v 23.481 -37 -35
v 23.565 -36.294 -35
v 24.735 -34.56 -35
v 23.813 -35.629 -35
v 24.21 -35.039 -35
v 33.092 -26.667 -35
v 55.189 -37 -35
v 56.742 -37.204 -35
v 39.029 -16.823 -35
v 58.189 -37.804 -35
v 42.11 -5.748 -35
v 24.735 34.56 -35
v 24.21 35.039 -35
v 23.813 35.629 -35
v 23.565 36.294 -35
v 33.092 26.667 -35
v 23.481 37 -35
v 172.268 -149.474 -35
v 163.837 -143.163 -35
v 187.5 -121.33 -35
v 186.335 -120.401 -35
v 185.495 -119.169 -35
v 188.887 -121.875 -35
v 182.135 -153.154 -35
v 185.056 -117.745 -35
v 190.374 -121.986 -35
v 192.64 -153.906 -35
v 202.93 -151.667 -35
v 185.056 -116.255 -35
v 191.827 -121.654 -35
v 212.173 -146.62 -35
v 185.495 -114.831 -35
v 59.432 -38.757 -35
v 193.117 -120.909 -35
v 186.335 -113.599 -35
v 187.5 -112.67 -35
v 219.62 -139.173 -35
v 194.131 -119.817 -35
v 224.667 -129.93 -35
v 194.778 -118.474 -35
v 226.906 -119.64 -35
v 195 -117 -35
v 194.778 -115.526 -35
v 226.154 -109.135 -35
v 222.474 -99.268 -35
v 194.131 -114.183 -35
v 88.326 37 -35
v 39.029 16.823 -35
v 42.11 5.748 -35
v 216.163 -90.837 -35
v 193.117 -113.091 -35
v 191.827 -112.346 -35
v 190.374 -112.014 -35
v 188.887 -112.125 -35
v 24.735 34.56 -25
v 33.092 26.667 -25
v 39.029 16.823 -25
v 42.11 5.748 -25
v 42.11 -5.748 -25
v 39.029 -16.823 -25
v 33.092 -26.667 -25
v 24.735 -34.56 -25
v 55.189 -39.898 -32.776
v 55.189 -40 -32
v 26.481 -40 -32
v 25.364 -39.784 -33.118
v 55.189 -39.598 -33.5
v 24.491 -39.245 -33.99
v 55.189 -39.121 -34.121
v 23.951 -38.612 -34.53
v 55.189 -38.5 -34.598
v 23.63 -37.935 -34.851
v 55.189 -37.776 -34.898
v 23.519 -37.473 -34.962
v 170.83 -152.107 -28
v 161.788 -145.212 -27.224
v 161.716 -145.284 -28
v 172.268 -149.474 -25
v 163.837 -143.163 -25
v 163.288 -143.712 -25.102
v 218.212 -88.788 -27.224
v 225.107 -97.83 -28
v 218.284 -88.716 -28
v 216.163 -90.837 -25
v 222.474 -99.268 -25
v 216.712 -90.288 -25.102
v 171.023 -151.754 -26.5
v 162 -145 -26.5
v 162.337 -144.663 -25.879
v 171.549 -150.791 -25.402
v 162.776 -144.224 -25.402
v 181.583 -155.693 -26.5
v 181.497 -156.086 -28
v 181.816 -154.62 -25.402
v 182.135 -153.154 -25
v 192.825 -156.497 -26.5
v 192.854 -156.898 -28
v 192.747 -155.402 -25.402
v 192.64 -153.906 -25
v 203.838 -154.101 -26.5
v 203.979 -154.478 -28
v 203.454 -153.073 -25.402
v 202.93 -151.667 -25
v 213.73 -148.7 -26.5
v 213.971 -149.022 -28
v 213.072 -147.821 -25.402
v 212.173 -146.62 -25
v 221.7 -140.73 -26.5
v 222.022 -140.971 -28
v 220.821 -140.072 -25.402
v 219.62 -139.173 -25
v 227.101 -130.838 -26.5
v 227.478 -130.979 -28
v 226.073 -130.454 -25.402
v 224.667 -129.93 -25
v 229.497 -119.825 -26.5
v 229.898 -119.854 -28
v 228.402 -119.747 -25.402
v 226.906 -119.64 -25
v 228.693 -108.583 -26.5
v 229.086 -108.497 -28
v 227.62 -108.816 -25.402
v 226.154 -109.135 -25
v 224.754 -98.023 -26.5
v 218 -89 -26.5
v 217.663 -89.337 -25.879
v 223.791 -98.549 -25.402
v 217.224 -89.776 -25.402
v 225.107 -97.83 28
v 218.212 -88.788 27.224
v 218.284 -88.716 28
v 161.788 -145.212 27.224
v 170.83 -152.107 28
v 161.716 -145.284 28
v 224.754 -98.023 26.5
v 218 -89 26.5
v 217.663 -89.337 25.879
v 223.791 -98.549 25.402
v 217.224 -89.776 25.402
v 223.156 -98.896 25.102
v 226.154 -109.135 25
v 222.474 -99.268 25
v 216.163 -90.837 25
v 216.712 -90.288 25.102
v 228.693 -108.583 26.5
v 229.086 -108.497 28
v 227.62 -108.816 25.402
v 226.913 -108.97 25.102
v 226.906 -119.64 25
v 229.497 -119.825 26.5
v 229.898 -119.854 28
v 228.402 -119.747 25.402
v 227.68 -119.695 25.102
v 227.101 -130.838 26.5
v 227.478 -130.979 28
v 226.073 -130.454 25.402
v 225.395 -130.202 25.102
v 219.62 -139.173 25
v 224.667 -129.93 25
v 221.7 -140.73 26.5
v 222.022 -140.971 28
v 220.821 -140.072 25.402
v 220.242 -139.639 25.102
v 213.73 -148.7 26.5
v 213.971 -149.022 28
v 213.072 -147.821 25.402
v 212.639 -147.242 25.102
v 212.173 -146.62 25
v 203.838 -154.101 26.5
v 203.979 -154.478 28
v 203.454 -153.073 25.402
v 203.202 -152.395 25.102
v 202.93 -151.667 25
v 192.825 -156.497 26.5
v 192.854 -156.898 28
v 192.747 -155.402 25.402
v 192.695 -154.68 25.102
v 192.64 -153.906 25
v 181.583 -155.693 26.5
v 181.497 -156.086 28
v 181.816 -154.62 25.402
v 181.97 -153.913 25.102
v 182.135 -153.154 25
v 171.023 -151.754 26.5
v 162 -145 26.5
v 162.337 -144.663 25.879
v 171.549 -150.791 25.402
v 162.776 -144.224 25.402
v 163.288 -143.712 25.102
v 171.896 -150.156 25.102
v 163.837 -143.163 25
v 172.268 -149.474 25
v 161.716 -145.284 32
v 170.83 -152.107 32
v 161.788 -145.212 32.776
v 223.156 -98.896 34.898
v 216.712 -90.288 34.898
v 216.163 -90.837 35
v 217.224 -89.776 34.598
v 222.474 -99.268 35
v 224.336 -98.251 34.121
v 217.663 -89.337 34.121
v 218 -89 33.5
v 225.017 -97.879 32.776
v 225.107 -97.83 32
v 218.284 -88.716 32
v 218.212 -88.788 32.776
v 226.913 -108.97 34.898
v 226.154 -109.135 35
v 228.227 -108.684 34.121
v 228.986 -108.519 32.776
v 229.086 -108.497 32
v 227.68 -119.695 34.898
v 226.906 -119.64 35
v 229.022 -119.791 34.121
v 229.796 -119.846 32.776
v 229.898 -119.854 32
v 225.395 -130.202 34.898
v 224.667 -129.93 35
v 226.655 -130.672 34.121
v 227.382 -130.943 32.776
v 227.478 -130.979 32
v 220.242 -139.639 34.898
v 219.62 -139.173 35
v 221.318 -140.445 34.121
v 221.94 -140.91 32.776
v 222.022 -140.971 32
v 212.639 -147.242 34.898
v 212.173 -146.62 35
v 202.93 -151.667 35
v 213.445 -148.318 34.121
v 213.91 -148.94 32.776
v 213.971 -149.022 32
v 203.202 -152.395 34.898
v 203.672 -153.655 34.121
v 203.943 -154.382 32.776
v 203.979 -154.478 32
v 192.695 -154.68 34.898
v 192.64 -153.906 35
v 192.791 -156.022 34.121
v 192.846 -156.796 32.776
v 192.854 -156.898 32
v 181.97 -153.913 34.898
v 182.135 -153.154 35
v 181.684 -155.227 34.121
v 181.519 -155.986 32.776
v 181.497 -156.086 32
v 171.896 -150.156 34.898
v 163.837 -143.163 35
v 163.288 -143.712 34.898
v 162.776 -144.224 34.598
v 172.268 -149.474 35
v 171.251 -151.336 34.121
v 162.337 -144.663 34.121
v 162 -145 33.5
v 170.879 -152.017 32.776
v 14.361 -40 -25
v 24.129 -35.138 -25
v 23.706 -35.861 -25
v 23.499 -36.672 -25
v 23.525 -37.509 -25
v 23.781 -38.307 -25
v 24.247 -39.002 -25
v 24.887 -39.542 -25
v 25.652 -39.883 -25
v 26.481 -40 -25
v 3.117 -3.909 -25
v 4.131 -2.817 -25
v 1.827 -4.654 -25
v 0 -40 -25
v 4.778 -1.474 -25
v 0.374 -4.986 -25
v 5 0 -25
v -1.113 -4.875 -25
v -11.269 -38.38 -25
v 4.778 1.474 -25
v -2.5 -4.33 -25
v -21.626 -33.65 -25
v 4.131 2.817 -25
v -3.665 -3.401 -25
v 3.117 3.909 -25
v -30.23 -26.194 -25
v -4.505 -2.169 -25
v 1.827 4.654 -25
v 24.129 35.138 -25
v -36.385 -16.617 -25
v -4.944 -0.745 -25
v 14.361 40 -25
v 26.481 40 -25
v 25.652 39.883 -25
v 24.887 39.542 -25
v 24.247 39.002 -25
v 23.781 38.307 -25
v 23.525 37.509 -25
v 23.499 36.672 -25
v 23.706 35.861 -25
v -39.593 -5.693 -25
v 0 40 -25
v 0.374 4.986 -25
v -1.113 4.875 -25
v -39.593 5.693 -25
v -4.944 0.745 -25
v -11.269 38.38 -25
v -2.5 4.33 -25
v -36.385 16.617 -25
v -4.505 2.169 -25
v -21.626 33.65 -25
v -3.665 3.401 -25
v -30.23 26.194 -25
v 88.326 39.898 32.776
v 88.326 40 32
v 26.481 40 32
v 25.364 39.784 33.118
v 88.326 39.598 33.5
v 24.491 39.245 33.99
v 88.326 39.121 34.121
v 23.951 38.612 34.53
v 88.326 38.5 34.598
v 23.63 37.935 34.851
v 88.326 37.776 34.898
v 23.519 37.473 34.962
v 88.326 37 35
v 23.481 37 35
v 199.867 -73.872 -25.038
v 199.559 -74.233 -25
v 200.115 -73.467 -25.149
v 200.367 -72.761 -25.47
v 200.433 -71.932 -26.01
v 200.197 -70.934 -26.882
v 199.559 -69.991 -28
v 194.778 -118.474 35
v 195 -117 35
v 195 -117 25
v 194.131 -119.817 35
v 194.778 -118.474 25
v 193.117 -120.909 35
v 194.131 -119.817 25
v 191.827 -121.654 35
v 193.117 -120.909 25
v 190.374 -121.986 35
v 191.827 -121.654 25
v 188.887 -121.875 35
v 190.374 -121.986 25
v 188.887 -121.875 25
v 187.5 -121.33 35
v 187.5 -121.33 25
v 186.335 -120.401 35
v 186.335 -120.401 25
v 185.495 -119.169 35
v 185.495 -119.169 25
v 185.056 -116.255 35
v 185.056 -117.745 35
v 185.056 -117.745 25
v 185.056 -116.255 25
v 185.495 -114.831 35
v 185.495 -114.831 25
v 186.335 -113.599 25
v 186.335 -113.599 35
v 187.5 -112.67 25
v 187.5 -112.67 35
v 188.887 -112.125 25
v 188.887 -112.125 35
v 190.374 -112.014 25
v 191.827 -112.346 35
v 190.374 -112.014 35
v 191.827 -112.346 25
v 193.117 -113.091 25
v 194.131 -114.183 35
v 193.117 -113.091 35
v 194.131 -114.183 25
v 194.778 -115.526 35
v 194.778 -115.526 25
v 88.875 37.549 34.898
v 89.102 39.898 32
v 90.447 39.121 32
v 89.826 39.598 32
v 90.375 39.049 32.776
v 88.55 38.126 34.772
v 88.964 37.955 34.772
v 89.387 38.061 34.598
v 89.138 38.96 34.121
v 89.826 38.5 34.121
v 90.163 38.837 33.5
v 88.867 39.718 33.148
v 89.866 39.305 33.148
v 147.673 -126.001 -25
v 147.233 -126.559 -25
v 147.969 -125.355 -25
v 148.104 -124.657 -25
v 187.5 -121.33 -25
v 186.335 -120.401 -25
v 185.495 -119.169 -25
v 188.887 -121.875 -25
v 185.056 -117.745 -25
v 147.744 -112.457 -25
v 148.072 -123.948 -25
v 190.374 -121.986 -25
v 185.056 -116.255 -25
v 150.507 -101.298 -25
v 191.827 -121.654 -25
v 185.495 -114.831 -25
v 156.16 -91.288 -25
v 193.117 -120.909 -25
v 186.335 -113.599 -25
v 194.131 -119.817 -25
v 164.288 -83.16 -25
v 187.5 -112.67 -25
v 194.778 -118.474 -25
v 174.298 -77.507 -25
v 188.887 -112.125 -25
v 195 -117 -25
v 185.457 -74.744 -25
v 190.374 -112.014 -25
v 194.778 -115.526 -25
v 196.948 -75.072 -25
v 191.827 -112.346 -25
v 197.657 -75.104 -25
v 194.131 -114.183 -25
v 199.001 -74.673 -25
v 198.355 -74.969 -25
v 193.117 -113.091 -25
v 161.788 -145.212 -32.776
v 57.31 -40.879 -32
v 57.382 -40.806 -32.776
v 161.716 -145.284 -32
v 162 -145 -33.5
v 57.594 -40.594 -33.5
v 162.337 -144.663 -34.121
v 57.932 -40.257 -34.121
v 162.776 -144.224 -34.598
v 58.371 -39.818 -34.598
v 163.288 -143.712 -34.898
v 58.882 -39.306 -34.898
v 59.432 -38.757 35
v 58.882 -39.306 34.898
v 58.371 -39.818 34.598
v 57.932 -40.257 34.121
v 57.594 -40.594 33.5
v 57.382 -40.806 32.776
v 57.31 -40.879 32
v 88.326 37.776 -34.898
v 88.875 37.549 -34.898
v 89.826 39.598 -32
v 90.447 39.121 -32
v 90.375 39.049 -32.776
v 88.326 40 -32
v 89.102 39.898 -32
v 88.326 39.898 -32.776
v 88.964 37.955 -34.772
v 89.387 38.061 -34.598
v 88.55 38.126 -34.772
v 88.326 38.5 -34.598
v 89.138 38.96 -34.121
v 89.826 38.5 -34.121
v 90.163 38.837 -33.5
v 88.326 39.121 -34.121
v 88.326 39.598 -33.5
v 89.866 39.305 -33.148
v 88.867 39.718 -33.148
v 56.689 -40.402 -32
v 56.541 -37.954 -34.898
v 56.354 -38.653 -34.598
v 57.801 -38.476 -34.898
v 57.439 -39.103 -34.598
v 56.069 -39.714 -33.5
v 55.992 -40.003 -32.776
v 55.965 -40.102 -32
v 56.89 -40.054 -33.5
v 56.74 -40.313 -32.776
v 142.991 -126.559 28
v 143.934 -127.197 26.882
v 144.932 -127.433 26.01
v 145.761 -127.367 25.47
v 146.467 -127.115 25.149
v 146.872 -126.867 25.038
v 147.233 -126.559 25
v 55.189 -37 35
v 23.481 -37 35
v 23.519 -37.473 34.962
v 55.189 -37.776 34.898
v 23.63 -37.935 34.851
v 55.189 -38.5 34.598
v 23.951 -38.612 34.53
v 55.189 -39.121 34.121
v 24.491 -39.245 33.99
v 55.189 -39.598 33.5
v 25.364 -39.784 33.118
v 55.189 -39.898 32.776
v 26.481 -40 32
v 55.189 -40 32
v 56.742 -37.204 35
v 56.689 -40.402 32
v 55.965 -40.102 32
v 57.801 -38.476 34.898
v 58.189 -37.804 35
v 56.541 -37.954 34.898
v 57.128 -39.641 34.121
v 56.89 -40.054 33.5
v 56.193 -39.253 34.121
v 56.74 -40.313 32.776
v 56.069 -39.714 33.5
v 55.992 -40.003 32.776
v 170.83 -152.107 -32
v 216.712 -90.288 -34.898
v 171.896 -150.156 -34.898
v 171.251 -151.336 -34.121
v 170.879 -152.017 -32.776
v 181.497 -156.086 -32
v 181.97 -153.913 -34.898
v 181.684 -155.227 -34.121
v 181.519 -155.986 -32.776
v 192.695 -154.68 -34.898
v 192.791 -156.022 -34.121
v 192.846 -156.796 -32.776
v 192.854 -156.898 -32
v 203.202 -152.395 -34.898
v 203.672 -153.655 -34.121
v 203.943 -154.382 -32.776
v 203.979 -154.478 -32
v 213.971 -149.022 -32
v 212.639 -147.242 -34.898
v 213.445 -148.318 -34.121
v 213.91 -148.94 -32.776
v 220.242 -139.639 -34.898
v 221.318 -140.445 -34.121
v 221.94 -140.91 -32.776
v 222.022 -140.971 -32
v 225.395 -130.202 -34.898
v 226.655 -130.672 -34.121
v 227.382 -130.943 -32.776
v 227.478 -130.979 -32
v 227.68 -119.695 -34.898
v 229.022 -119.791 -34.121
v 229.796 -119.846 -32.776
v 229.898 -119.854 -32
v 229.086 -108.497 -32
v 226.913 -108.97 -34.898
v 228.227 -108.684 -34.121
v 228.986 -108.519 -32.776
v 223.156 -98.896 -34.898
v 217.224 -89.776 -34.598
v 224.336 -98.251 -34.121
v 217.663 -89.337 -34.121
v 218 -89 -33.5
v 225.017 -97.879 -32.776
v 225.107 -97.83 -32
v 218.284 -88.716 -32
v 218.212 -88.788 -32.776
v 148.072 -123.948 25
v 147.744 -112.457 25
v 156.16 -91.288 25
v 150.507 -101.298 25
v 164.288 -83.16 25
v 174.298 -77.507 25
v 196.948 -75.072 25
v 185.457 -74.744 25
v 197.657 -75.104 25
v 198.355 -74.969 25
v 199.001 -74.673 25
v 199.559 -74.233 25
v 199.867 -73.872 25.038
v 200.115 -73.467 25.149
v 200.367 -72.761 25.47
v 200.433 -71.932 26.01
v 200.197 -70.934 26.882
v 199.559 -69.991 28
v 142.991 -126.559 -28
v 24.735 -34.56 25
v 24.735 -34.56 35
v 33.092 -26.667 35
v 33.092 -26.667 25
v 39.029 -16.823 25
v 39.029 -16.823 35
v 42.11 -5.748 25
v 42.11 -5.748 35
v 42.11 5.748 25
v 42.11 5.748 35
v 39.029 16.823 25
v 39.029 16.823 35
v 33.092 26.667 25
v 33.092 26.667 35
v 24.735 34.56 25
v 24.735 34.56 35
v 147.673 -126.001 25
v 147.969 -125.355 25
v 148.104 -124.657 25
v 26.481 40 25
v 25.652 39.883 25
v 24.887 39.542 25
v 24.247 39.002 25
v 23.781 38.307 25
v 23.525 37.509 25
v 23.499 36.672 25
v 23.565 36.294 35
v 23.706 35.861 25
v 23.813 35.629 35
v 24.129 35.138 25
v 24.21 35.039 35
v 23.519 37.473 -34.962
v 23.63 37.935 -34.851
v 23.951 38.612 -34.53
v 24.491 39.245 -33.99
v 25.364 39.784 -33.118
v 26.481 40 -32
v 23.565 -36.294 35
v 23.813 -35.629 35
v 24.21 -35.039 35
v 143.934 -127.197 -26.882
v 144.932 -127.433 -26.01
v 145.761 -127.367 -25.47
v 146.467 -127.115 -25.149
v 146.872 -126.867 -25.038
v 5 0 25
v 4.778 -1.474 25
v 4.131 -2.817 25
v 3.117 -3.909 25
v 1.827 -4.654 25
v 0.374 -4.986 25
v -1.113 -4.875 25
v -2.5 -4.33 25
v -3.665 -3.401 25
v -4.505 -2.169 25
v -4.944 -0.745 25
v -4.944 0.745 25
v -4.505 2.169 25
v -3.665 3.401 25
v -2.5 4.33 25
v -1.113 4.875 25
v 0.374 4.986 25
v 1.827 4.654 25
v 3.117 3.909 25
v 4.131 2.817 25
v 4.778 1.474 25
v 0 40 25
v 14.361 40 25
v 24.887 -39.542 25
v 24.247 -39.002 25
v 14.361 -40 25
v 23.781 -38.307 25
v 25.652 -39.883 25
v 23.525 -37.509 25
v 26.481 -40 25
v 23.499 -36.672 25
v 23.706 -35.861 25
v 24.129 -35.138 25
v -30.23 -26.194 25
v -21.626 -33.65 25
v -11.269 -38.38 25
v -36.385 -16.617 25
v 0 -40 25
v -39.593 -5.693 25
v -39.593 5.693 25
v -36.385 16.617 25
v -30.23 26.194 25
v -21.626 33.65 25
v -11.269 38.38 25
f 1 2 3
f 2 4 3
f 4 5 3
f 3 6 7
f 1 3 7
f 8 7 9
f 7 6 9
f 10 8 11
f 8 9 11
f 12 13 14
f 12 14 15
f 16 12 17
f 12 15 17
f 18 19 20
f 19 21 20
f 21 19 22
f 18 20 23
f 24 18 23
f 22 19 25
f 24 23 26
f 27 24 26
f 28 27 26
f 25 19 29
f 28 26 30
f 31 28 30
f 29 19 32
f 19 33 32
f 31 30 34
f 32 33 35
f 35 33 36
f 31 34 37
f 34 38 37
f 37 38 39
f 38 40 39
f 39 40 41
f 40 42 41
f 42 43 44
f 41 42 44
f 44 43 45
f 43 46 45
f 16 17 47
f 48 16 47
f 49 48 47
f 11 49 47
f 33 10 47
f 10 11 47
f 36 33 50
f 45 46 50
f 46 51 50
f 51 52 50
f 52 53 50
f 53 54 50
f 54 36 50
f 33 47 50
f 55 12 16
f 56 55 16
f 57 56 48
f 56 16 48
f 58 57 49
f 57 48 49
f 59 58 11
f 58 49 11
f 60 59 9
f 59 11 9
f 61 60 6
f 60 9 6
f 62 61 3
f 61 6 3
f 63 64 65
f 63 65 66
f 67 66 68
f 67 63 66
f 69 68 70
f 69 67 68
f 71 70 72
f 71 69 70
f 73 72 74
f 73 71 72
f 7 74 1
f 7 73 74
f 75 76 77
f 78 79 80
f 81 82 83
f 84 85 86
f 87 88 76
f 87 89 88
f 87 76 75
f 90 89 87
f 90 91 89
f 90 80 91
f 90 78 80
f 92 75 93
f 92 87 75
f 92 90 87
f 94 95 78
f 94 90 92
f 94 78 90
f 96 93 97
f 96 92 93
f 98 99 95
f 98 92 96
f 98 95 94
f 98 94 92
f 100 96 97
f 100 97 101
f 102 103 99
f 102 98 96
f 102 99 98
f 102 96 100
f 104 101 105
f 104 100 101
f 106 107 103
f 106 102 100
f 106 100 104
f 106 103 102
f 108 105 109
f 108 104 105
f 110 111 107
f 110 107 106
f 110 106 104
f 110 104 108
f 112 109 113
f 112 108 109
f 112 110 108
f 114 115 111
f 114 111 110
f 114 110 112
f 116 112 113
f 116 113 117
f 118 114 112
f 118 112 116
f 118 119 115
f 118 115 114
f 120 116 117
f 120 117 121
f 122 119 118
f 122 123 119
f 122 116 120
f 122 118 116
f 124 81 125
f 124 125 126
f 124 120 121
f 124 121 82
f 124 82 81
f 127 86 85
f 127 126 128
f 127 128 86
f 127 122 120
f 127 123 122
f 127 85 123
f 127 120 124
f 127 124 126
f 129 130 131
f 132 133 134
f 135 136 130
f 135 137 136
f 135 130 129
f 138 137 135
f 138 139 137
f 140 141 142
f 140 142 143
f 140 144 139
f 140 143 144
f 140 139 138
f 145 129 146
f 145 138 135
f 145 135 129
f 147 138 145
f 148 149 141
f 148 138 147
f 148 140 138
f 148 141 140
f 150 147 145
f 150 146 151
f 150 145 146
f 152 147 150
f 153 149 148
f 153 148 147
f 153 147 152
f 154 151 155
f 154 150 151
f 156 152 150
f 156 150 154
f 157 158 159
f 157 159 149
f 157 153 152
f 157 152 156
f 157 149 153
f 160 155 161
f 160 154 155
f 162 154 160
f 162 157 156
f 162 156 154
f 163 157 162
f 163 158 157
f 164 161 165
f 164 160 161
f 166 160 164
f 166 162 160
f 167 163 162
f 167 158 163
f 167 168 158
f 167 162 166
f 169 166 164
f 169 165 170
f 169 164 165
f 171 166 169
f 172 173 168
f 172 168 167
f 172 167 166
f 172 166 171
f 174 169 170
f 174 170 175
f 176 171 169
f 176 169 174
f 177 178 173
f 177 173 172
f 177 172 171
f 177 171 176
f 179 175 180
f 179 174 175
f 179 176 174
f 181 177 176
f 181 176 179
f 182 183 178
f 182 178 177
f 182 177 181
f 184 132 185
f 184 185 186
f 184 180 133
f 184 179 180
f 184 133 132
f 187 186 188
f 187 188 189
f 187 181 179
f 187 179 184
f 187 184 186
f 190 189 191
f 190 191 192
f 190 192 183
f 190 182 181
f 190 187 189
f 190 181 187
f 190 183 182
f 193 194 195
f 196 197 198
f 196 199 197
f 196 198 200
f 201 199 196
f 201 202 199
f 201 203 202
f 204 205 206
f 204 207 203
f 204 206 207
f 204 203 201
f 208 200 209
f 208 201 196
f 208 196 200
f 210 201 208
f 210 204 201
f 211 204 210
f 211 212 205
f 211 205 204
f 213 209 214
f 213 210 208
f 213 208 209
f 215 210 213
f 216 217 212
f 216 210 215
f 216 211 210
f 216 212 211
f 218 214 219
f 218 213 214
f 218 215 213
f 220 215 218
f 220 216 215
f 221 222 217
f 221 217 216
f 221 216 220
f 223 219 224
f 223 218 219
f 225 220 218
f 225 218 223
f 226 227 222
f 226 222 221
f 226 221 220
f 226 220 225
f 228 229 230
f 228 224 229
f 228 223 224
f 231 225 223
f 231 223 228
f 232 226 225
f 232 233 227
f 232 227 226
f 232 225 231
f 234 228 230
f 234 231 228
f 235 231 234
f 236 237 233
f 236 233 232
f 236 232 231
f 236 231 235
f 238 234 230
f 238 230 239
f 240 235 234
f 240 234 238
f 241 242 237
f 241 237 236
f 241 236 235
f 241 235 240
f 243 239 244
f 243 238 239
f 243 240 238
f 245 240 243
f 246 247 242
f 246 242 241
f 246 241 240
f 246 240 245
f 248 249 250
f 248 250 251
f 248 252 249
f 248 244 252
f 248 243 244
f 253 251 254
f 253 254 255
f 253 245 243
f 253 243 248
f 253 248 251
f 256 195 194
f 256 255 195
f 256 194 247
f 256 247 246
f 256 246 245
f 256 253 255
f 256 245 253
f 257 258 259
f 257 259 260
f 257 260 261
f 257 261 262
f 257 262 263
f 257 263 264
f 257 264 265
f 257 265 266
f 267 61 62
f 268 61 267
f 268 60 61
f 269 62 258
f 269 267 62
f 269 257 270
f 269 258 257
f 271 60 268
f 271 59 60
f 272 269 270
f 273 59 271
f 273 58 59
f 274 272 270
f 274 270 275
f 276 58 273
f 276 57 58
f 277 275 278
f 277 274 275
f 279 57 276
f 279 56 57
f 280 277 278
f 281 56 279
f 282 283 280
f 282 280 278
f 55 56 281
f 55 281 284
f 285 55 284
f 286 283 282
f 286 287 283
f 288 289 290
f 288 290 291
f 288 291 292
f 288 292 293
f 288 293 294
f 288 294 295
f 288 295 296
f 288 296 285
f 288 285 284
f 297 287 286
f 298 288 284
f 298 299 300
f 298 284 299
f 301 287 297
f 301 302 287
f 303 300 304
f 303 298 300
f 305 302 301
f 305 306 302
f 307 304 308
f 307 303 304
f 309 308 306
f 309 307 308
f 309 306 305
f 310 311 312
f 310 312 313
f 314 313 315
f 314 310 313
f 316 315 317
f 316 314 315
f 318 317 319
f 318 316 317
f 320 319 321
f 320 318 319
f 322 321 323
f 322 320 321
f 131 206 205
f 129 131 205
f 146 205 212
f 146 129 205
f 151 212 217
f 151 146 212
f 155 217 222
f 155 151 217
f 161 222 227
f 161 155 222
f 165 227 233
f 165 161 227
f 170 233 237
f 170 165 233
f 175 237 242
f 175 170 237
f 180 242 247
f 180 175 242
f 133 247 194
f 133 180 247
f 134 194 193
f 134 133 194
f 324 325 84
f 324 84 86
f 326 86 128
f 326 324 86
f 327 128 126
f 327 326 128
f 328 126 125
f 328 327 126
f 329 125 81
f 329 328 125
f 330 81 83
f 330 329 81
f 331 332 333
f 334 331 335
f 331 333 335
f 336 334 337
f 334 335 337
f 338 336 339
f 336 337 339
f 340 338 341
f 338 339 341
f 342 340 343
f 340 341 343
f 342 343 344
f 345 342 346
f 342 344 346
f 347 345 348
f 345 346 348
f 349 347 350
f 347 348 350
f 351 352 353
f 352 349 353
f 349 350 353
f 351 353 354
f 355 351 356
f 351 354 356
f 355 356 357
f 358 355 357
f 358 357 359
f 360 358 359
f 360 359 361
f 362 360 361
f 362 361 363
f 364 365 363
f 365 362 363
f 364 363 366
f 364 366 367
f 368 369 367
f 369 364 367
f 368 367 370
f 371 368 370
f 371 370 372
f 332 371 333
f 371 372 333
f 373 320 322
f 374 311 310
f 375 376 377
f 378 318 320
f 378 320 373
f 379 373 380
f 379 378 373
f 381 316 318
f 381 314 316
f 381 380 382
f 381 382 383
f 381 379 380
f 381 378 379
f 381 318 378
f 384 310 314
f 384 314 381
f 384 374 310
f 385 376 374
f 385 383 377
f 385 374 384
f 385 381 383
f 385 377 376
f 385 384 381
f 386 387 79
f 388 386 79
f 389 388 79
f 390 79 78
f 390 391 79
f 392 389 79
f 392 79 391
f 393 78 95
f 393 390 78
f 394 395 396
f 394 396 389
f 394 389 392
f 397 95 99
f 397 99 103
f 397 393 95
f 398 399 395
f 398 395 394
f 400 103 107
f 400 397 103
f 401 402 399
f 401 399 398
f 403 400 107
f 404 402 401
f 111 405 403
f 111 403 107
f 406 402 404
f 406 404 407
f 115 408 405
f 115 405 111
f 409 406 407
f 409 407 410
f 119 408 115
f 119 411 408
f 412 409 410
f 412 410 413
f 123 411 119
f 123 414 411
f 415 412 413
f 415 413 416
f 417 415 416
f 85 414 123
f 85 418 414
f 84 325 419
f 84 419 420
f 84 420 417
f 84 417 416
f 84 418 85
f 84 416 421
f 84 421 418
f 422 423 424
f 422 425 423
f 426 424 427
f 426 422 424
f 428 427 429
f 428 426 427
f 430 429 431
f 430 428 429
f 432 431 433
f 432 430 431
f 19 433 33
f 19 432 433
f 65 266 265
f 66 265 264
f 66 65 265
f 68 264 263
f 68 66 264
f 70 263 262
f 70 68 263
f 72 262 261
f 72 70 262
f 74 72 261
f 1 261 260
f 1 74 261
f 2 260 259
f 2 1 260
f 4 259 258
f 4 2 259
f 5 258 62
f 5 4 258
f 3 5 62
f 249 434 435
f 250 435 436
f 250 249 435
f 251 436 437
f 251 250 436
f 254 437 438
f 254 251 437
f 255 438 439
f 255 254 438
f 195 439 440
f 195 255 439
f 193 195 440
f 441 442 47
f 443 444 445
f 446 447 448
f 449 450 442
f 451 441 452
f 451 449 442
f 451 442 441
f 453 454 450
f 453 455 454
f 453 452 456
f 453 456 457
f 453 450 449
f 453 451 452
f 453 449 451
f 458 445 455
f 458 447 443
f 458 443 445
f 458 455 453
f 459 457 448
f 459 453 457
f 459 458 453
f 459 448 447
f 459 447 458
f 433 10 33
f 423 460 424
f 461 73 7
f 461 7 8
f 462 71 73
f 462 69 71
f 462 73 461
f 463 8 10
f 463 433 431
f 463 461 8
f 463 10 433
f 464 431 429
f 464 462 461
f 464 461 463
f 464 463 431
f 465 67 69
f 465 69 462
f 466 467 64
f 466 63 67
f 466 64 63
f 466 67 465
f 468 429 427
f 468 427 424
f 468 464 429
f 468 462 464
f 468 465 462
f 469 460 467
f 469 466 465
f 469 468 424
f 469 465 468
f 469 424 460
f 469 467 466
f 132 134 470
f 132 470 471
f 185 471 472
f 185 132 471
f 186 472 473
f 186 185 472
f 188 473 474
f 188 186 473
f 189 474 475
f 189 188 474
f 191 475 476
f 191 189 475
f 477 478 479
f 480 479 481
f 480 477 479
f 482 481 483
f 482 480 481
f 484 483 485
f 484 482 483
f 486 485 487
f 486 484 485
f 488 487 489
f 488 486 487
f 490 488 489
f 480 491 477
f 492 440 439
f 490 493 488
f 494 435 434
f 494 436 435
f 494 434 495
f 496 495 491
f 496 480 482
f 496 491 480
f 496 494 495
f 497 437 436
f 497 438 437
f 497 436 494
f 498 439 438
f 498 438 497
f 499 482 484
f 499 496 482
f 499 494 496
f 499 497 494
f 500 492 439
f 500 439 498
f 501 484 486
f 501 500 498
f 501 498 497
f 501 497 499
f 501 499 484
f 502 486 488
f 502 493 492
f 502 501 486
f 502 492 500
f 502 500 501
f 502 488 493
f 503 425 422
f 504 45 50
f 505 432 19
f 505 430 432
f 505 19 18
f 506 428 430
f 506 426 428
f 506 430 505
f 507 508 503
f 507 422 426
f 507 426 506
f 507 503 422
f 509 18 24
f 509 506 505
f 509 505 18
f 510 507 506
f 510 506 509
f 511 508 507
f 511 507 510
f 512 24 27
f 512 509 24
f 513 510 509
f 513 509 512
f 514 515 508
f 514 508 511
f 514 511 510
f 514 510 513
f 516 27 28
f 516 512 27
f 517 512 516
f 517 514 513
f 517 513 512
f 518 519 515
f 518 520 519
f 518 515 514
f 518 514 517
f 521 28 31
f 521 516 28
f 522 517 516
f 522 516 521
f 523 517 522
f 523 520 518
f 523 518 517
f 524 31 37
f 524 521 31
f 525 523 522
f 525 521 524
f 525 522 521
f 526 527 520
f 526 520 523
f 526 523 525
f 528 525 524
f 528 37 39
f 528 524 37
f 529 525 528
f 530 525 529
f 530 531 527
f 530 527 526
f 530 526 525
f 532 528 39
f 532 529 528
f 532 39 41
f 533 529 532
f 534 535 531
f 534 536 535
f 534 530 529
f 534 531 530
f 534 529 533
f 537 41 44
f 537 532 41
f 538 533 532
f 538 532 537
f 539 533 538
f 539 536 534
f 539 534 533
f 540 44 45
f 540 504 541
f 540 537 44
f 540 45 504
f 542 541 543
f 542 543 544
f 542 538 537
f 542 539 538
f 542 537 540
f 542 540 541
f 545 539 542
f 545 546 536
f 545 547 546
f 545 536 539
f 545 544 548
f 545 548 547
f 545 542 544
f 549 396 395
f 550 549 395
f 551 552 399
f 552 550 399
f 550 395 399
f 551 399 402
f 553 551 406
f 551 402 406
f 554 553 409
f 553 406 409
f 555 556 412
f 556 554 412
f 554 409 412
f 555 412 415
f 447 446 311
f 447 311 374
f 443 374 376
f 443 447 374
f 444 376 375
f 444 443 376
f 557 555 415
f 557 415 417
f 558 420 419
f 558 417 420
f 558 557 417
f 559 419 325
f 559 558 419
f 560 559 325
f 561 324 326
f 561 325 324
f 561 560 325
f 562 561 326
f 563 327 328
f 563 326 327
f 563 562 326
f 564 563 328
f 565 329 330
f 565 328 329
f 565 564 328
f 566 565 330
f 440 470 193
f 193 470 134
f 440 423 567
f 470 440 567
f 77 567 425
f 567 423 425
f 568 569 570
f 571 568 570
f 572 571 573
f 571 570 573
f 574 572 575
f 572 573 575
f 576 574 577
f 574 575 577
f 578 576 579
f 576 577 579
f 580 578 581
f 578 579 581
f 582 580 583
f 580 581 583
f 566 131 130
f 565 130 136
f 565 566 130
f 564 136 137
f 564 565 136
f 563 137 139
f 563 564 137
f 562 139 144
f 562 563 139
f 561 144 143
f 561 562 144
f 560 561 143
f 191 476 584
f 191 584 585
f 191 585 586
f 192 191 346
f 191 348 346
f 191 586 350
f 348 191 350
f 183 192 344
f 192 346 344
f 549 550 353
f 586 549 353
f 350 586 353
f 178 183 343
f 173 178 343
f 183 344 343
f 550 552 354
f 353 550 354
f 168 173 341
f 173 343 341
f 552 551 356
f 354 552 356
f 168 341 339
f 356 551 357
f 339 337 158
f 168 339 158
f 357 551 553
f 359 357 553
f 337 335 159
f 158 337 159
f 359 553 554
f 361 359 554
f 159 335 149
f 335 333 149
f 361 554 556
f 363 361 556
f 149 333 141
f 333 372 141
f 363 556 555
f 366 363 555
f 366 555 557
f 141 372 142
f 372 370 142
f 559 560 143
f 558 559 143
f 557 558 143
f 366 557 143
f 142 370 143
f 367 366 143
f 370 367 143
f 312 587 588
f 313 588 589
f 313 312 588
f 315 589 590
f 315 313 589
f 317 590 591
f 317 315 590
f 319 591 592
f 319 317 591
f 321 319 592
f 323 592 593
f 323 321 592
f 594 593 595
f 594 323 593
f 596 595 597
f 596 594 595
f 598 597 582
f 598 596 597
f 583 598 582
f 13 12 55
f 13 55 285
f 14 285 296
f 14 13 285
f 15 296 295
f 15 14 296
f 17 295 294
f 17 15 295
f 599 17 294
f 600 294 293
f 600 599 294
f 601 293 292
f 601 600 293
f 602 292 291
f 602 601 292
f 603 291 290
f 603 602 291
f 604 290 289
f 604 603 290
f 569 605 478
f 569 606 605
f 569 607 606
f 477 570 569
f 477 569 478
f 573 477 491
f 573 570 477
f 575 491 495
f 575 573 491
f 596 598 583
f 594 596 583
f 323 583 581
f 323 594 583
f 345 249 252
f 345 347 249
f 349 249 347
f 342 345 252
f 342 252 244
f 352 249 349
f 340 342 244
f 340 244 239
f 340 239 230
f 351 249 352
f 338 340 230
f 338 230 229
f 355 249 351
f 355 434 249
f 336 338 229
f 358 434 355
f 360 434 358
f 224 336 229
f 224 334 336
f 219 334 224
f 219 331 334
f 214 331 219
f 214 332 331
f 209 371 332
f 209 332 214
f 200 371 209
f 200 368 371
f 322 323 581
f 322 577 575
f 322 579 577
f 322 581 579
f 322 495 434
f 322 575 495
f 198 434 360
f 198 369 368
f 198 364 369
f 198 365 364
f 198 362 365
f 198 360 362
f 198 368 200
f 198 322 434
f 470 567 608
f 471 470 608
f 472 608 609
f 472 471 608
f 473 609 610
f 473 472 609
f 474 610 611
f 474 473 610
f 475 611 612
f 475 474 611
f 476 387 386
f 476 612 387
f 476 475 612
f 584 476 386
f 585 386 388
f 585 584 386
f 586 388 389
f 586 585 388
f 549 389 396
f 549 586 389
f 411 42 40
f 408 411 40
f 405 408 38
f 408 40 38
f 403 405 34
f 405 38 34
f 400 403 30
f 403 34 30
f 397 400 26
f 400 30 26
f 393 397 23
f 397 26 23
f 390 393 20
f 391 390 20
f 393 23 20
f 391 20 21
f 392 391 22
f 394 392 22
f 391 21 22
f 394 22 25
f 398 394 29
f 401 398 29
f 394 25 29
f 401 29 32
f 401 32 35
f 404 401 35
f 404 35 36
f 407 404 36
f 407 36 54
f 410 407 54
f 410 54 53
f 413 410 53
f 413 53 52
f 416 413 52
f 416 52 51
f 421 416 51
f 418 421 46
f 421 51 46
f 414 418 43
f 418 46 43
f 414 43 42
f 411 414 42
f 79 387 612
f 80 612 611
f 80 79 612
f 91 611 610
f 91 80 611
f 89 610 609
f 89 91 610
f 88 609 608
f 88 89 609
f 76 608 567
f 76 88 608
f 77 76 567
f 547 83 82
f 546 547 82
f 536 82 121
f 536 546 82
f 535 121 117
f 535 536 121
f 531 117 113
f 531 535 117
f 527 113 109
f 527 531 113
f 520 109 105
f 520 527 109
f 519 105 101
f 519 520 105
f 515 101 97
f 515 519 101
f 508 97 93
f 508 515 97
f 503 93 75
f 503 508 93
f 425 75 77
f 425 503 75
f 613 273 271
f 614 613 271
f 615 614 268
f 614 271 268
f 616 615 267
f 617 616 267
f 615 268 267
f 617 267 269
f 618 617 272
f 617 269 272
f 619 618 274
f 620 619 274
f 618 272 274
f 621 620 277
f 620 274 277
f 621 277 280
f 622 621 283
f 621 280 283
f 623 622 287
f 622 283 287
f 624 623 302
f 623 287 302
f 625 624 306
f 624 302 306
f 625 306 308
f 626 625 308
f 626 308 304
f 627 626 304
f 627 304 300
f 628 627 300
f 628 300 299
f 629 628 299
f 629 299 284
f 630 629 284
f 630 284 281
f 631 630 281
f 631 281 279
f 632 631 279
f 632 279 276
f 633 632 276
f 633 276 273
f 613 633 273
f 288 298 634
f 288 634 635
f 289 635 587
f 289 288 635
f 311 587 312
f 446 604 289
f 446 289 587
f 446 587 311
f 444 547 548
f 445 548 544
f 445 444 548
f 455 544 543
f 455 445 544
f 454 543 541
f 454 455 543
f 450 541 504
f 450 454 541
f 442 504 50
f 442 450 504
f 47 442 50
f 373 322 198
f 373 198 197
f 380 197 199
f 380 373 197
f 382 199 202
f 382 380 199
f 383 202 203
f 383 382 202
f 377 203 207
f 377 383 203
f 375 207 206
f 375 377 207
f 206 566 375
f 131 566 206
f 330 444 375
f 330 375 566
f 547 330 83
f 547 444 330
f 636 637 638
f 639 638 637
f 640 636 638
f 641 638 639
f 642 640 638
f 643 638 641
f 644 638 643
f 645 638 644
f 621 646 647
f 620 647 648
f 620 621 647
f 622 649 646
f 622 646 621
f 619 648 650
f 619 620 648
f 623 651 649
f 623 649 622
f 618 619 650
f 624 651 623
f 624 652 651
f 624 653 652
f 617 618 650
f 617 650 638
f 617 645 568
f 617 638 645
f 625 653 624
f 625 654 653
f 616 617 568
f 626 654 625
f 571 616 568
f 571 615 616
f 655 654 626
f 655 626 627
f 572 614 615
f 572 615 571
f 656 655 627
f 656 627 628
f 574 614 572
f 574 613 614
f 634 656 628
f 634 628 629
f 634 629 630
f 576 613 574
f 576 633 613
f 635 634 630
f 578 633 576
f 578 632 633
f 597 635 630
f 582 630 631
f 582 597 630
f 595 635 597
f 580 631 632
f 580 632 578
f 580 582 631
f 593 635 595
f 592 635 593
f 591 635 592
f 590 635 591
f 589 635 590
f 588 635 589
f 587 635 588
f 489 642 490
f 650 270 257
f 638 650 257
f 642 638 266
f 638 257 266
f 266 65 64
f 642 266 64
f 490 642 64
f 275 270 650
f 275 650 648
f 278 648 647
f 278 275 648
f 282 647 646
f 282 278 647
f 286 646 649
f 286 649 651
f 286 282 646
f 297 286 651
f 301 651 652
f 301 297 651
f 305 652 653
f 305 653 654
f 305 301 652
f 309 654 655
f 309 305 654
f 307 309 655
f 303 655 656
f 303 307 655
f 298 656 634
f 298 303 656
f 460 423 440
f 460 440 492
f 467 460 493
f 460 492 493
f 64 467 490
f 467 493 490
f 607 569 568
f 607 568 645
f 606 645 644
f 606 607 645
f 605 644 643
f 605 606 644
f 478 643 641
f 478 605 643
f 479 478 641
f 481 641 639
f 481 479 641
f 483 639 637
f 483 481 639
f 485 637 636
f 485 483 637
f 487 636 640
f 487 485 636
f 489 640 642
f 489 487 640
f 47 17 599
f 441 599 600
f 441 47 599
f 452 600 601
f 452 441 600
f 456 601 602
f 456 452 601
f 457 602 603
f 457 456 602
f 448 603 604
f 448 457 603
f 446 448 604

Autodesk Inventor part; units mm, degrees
ref_plane "YZ Plane" through (0, 0, 0) normal (1, 0, 0) x (0, 1, 0)
ref_plane "XZ Plane" through (0, 0, 0) normal (0, 1, 0) x (-1, 0, 0)
ref_plane "XY Plane" through (0, 0, 0) normal (0, 0, 1) x (1, 0, 0)
sketch "Sketch1" plane through (0, 0, 0) normal (0, 0, 1) x (1, 0, 0)
  arc A0 (0, 40) -> (0, -40) centre (0, 0) ccw
  arc A1 (161.7157, -145.2843) -> (218.2843, -88.7157) centre (190, -117) ccw
  line L0 (0, 40) -> (89.5685, 40)
  line L1 (89.5685, 40) -> (218.2843, -88.7157)
  line L2 (0, -40) -> (56.4315, -40)
  line L3 (56.4315, -40) -> (161.7157, -145.2843)
  arc A2 (0, -40) -> (0, 40) centre (0, 0) ccw construction
  arc A3 (218.2843, -88.7157) -> (161.7157, -145.2843) centre (190, -117) ccw construction
  circle A4 centre (0, 0) radius 5
  circle A5 centre (190, -117) radius 5
  line L4 (0, -40) -> (161.7157, -40)
  line L5 (93.4315, -77) -> (190, -77)
  dimension "d0" = 80
  dimension "d1" = 80
  dimension "d2" = 190
  dimension "d3" = 117
  dimension "d4" = 135
  dimension "d9" = 10
  dimension "d10" = 10
extrude "Extrusion1" add sketch "Sketch1" along normal mid plane 70
sketch "Sketch2" plane through (0, 0, 0) normal (0, 0, 1) x (1, 0, 0)
  arc A0 (0, 40) -> (0, -40) centre (0, 0) ccw projected
  line L0 (0, -40) -> (56.4315, -40) projected
  line L1 (56.4315, -40) -> (161.7157, -145.2843) projected
  arc A1 (161.7157, -145.2843) -> (218.2843, -88.7157) centre (190, -117) ccw projected
  line L2 (218.2843, -88.7157) -> (89.5685, 40) projected
  line L3 (89.5685, 40) -> (0, 40) projected
  circle A2 centre (0, 0) radius 42.5
  circle A3 centre (190, -117) radius 42.5
  point P0 (208.1292, -78.5607)
  point P1 (151.5607, -135.1292)
  dimension "d7" = 85
  dimension "d8" = 85
extrude "Extrusion2" cut sketch "Sketch2" along normal mid plane 50 contours L2 A1 L1 A3 picked at (179.9827, -106.9827)
sketch "Sketch3" plane through (0, 0, 35) normal (0, 0, 1) x (1, 0, 0)
  arc A0 (0, 40) -> (0, -40) centre (0, 0) ccw projected
  line L0 (0, -40) -> (56.4315, -40) projected
  line L1 (56.4315, -40) -> (161.7157, -145.2843) projected
  arc A1 (161.7157, -145.2843) -> (218.2843, -88.7157) centre (190, -117) ccw projected
  line L2 (218.2843, -88.7157) -> (89.5685, 40) projected
  line L3 (89.5685, 40) -> (0, 40) projected
  circle A2 centre (0, 0) radius 5 projected
  circle A3 centre (190, -117) radius 5 projected
  circle A4 centre (0, 0) radius 42.5
  dimension "d13" = 85
extrude "Extrusion3" cut sketch "Sketch3" against normal blind 10 contours L3 A4 L0 A0 | A0 L0 A4 L3 | A2
mirror "Mirror1" about plane through (0, 0, 0) normal (0, 0, 1) of "Extrusion3"
fillet "Fillet1" radius 3 24 edges at (14.3614, 40, -30) (14.3614, 40, 30) (14.3614, -40, 30) (14.3614, -40, -30) (151.5607, -135.1292, 0) (208.1292, -78.5607, 0) (51.965, 40, 35) (218.2843, -145.2843, 35) (109.0736, -92.6421, 35) (153.9264, -24.3579, 35) (51.965, 40, -35) (218.2843, -145.2843, -35) (109.0736, -92.6421, -35) (153.9264, -24.3579, -35) (89.5685, 40, 0) (56.4315, -40, 0) (35.3964, -40, 35) (35.3964, -40, -35) (213.2067, -83.6382, 25) (156.6382, -140.2067, 25) (218.2843, -145.2843, 25) (156.6382, -140.2067, -25) (213.2067, -83.6382, -25) (218.2843, -145.2843, -25)
properties part number "Arm2"
